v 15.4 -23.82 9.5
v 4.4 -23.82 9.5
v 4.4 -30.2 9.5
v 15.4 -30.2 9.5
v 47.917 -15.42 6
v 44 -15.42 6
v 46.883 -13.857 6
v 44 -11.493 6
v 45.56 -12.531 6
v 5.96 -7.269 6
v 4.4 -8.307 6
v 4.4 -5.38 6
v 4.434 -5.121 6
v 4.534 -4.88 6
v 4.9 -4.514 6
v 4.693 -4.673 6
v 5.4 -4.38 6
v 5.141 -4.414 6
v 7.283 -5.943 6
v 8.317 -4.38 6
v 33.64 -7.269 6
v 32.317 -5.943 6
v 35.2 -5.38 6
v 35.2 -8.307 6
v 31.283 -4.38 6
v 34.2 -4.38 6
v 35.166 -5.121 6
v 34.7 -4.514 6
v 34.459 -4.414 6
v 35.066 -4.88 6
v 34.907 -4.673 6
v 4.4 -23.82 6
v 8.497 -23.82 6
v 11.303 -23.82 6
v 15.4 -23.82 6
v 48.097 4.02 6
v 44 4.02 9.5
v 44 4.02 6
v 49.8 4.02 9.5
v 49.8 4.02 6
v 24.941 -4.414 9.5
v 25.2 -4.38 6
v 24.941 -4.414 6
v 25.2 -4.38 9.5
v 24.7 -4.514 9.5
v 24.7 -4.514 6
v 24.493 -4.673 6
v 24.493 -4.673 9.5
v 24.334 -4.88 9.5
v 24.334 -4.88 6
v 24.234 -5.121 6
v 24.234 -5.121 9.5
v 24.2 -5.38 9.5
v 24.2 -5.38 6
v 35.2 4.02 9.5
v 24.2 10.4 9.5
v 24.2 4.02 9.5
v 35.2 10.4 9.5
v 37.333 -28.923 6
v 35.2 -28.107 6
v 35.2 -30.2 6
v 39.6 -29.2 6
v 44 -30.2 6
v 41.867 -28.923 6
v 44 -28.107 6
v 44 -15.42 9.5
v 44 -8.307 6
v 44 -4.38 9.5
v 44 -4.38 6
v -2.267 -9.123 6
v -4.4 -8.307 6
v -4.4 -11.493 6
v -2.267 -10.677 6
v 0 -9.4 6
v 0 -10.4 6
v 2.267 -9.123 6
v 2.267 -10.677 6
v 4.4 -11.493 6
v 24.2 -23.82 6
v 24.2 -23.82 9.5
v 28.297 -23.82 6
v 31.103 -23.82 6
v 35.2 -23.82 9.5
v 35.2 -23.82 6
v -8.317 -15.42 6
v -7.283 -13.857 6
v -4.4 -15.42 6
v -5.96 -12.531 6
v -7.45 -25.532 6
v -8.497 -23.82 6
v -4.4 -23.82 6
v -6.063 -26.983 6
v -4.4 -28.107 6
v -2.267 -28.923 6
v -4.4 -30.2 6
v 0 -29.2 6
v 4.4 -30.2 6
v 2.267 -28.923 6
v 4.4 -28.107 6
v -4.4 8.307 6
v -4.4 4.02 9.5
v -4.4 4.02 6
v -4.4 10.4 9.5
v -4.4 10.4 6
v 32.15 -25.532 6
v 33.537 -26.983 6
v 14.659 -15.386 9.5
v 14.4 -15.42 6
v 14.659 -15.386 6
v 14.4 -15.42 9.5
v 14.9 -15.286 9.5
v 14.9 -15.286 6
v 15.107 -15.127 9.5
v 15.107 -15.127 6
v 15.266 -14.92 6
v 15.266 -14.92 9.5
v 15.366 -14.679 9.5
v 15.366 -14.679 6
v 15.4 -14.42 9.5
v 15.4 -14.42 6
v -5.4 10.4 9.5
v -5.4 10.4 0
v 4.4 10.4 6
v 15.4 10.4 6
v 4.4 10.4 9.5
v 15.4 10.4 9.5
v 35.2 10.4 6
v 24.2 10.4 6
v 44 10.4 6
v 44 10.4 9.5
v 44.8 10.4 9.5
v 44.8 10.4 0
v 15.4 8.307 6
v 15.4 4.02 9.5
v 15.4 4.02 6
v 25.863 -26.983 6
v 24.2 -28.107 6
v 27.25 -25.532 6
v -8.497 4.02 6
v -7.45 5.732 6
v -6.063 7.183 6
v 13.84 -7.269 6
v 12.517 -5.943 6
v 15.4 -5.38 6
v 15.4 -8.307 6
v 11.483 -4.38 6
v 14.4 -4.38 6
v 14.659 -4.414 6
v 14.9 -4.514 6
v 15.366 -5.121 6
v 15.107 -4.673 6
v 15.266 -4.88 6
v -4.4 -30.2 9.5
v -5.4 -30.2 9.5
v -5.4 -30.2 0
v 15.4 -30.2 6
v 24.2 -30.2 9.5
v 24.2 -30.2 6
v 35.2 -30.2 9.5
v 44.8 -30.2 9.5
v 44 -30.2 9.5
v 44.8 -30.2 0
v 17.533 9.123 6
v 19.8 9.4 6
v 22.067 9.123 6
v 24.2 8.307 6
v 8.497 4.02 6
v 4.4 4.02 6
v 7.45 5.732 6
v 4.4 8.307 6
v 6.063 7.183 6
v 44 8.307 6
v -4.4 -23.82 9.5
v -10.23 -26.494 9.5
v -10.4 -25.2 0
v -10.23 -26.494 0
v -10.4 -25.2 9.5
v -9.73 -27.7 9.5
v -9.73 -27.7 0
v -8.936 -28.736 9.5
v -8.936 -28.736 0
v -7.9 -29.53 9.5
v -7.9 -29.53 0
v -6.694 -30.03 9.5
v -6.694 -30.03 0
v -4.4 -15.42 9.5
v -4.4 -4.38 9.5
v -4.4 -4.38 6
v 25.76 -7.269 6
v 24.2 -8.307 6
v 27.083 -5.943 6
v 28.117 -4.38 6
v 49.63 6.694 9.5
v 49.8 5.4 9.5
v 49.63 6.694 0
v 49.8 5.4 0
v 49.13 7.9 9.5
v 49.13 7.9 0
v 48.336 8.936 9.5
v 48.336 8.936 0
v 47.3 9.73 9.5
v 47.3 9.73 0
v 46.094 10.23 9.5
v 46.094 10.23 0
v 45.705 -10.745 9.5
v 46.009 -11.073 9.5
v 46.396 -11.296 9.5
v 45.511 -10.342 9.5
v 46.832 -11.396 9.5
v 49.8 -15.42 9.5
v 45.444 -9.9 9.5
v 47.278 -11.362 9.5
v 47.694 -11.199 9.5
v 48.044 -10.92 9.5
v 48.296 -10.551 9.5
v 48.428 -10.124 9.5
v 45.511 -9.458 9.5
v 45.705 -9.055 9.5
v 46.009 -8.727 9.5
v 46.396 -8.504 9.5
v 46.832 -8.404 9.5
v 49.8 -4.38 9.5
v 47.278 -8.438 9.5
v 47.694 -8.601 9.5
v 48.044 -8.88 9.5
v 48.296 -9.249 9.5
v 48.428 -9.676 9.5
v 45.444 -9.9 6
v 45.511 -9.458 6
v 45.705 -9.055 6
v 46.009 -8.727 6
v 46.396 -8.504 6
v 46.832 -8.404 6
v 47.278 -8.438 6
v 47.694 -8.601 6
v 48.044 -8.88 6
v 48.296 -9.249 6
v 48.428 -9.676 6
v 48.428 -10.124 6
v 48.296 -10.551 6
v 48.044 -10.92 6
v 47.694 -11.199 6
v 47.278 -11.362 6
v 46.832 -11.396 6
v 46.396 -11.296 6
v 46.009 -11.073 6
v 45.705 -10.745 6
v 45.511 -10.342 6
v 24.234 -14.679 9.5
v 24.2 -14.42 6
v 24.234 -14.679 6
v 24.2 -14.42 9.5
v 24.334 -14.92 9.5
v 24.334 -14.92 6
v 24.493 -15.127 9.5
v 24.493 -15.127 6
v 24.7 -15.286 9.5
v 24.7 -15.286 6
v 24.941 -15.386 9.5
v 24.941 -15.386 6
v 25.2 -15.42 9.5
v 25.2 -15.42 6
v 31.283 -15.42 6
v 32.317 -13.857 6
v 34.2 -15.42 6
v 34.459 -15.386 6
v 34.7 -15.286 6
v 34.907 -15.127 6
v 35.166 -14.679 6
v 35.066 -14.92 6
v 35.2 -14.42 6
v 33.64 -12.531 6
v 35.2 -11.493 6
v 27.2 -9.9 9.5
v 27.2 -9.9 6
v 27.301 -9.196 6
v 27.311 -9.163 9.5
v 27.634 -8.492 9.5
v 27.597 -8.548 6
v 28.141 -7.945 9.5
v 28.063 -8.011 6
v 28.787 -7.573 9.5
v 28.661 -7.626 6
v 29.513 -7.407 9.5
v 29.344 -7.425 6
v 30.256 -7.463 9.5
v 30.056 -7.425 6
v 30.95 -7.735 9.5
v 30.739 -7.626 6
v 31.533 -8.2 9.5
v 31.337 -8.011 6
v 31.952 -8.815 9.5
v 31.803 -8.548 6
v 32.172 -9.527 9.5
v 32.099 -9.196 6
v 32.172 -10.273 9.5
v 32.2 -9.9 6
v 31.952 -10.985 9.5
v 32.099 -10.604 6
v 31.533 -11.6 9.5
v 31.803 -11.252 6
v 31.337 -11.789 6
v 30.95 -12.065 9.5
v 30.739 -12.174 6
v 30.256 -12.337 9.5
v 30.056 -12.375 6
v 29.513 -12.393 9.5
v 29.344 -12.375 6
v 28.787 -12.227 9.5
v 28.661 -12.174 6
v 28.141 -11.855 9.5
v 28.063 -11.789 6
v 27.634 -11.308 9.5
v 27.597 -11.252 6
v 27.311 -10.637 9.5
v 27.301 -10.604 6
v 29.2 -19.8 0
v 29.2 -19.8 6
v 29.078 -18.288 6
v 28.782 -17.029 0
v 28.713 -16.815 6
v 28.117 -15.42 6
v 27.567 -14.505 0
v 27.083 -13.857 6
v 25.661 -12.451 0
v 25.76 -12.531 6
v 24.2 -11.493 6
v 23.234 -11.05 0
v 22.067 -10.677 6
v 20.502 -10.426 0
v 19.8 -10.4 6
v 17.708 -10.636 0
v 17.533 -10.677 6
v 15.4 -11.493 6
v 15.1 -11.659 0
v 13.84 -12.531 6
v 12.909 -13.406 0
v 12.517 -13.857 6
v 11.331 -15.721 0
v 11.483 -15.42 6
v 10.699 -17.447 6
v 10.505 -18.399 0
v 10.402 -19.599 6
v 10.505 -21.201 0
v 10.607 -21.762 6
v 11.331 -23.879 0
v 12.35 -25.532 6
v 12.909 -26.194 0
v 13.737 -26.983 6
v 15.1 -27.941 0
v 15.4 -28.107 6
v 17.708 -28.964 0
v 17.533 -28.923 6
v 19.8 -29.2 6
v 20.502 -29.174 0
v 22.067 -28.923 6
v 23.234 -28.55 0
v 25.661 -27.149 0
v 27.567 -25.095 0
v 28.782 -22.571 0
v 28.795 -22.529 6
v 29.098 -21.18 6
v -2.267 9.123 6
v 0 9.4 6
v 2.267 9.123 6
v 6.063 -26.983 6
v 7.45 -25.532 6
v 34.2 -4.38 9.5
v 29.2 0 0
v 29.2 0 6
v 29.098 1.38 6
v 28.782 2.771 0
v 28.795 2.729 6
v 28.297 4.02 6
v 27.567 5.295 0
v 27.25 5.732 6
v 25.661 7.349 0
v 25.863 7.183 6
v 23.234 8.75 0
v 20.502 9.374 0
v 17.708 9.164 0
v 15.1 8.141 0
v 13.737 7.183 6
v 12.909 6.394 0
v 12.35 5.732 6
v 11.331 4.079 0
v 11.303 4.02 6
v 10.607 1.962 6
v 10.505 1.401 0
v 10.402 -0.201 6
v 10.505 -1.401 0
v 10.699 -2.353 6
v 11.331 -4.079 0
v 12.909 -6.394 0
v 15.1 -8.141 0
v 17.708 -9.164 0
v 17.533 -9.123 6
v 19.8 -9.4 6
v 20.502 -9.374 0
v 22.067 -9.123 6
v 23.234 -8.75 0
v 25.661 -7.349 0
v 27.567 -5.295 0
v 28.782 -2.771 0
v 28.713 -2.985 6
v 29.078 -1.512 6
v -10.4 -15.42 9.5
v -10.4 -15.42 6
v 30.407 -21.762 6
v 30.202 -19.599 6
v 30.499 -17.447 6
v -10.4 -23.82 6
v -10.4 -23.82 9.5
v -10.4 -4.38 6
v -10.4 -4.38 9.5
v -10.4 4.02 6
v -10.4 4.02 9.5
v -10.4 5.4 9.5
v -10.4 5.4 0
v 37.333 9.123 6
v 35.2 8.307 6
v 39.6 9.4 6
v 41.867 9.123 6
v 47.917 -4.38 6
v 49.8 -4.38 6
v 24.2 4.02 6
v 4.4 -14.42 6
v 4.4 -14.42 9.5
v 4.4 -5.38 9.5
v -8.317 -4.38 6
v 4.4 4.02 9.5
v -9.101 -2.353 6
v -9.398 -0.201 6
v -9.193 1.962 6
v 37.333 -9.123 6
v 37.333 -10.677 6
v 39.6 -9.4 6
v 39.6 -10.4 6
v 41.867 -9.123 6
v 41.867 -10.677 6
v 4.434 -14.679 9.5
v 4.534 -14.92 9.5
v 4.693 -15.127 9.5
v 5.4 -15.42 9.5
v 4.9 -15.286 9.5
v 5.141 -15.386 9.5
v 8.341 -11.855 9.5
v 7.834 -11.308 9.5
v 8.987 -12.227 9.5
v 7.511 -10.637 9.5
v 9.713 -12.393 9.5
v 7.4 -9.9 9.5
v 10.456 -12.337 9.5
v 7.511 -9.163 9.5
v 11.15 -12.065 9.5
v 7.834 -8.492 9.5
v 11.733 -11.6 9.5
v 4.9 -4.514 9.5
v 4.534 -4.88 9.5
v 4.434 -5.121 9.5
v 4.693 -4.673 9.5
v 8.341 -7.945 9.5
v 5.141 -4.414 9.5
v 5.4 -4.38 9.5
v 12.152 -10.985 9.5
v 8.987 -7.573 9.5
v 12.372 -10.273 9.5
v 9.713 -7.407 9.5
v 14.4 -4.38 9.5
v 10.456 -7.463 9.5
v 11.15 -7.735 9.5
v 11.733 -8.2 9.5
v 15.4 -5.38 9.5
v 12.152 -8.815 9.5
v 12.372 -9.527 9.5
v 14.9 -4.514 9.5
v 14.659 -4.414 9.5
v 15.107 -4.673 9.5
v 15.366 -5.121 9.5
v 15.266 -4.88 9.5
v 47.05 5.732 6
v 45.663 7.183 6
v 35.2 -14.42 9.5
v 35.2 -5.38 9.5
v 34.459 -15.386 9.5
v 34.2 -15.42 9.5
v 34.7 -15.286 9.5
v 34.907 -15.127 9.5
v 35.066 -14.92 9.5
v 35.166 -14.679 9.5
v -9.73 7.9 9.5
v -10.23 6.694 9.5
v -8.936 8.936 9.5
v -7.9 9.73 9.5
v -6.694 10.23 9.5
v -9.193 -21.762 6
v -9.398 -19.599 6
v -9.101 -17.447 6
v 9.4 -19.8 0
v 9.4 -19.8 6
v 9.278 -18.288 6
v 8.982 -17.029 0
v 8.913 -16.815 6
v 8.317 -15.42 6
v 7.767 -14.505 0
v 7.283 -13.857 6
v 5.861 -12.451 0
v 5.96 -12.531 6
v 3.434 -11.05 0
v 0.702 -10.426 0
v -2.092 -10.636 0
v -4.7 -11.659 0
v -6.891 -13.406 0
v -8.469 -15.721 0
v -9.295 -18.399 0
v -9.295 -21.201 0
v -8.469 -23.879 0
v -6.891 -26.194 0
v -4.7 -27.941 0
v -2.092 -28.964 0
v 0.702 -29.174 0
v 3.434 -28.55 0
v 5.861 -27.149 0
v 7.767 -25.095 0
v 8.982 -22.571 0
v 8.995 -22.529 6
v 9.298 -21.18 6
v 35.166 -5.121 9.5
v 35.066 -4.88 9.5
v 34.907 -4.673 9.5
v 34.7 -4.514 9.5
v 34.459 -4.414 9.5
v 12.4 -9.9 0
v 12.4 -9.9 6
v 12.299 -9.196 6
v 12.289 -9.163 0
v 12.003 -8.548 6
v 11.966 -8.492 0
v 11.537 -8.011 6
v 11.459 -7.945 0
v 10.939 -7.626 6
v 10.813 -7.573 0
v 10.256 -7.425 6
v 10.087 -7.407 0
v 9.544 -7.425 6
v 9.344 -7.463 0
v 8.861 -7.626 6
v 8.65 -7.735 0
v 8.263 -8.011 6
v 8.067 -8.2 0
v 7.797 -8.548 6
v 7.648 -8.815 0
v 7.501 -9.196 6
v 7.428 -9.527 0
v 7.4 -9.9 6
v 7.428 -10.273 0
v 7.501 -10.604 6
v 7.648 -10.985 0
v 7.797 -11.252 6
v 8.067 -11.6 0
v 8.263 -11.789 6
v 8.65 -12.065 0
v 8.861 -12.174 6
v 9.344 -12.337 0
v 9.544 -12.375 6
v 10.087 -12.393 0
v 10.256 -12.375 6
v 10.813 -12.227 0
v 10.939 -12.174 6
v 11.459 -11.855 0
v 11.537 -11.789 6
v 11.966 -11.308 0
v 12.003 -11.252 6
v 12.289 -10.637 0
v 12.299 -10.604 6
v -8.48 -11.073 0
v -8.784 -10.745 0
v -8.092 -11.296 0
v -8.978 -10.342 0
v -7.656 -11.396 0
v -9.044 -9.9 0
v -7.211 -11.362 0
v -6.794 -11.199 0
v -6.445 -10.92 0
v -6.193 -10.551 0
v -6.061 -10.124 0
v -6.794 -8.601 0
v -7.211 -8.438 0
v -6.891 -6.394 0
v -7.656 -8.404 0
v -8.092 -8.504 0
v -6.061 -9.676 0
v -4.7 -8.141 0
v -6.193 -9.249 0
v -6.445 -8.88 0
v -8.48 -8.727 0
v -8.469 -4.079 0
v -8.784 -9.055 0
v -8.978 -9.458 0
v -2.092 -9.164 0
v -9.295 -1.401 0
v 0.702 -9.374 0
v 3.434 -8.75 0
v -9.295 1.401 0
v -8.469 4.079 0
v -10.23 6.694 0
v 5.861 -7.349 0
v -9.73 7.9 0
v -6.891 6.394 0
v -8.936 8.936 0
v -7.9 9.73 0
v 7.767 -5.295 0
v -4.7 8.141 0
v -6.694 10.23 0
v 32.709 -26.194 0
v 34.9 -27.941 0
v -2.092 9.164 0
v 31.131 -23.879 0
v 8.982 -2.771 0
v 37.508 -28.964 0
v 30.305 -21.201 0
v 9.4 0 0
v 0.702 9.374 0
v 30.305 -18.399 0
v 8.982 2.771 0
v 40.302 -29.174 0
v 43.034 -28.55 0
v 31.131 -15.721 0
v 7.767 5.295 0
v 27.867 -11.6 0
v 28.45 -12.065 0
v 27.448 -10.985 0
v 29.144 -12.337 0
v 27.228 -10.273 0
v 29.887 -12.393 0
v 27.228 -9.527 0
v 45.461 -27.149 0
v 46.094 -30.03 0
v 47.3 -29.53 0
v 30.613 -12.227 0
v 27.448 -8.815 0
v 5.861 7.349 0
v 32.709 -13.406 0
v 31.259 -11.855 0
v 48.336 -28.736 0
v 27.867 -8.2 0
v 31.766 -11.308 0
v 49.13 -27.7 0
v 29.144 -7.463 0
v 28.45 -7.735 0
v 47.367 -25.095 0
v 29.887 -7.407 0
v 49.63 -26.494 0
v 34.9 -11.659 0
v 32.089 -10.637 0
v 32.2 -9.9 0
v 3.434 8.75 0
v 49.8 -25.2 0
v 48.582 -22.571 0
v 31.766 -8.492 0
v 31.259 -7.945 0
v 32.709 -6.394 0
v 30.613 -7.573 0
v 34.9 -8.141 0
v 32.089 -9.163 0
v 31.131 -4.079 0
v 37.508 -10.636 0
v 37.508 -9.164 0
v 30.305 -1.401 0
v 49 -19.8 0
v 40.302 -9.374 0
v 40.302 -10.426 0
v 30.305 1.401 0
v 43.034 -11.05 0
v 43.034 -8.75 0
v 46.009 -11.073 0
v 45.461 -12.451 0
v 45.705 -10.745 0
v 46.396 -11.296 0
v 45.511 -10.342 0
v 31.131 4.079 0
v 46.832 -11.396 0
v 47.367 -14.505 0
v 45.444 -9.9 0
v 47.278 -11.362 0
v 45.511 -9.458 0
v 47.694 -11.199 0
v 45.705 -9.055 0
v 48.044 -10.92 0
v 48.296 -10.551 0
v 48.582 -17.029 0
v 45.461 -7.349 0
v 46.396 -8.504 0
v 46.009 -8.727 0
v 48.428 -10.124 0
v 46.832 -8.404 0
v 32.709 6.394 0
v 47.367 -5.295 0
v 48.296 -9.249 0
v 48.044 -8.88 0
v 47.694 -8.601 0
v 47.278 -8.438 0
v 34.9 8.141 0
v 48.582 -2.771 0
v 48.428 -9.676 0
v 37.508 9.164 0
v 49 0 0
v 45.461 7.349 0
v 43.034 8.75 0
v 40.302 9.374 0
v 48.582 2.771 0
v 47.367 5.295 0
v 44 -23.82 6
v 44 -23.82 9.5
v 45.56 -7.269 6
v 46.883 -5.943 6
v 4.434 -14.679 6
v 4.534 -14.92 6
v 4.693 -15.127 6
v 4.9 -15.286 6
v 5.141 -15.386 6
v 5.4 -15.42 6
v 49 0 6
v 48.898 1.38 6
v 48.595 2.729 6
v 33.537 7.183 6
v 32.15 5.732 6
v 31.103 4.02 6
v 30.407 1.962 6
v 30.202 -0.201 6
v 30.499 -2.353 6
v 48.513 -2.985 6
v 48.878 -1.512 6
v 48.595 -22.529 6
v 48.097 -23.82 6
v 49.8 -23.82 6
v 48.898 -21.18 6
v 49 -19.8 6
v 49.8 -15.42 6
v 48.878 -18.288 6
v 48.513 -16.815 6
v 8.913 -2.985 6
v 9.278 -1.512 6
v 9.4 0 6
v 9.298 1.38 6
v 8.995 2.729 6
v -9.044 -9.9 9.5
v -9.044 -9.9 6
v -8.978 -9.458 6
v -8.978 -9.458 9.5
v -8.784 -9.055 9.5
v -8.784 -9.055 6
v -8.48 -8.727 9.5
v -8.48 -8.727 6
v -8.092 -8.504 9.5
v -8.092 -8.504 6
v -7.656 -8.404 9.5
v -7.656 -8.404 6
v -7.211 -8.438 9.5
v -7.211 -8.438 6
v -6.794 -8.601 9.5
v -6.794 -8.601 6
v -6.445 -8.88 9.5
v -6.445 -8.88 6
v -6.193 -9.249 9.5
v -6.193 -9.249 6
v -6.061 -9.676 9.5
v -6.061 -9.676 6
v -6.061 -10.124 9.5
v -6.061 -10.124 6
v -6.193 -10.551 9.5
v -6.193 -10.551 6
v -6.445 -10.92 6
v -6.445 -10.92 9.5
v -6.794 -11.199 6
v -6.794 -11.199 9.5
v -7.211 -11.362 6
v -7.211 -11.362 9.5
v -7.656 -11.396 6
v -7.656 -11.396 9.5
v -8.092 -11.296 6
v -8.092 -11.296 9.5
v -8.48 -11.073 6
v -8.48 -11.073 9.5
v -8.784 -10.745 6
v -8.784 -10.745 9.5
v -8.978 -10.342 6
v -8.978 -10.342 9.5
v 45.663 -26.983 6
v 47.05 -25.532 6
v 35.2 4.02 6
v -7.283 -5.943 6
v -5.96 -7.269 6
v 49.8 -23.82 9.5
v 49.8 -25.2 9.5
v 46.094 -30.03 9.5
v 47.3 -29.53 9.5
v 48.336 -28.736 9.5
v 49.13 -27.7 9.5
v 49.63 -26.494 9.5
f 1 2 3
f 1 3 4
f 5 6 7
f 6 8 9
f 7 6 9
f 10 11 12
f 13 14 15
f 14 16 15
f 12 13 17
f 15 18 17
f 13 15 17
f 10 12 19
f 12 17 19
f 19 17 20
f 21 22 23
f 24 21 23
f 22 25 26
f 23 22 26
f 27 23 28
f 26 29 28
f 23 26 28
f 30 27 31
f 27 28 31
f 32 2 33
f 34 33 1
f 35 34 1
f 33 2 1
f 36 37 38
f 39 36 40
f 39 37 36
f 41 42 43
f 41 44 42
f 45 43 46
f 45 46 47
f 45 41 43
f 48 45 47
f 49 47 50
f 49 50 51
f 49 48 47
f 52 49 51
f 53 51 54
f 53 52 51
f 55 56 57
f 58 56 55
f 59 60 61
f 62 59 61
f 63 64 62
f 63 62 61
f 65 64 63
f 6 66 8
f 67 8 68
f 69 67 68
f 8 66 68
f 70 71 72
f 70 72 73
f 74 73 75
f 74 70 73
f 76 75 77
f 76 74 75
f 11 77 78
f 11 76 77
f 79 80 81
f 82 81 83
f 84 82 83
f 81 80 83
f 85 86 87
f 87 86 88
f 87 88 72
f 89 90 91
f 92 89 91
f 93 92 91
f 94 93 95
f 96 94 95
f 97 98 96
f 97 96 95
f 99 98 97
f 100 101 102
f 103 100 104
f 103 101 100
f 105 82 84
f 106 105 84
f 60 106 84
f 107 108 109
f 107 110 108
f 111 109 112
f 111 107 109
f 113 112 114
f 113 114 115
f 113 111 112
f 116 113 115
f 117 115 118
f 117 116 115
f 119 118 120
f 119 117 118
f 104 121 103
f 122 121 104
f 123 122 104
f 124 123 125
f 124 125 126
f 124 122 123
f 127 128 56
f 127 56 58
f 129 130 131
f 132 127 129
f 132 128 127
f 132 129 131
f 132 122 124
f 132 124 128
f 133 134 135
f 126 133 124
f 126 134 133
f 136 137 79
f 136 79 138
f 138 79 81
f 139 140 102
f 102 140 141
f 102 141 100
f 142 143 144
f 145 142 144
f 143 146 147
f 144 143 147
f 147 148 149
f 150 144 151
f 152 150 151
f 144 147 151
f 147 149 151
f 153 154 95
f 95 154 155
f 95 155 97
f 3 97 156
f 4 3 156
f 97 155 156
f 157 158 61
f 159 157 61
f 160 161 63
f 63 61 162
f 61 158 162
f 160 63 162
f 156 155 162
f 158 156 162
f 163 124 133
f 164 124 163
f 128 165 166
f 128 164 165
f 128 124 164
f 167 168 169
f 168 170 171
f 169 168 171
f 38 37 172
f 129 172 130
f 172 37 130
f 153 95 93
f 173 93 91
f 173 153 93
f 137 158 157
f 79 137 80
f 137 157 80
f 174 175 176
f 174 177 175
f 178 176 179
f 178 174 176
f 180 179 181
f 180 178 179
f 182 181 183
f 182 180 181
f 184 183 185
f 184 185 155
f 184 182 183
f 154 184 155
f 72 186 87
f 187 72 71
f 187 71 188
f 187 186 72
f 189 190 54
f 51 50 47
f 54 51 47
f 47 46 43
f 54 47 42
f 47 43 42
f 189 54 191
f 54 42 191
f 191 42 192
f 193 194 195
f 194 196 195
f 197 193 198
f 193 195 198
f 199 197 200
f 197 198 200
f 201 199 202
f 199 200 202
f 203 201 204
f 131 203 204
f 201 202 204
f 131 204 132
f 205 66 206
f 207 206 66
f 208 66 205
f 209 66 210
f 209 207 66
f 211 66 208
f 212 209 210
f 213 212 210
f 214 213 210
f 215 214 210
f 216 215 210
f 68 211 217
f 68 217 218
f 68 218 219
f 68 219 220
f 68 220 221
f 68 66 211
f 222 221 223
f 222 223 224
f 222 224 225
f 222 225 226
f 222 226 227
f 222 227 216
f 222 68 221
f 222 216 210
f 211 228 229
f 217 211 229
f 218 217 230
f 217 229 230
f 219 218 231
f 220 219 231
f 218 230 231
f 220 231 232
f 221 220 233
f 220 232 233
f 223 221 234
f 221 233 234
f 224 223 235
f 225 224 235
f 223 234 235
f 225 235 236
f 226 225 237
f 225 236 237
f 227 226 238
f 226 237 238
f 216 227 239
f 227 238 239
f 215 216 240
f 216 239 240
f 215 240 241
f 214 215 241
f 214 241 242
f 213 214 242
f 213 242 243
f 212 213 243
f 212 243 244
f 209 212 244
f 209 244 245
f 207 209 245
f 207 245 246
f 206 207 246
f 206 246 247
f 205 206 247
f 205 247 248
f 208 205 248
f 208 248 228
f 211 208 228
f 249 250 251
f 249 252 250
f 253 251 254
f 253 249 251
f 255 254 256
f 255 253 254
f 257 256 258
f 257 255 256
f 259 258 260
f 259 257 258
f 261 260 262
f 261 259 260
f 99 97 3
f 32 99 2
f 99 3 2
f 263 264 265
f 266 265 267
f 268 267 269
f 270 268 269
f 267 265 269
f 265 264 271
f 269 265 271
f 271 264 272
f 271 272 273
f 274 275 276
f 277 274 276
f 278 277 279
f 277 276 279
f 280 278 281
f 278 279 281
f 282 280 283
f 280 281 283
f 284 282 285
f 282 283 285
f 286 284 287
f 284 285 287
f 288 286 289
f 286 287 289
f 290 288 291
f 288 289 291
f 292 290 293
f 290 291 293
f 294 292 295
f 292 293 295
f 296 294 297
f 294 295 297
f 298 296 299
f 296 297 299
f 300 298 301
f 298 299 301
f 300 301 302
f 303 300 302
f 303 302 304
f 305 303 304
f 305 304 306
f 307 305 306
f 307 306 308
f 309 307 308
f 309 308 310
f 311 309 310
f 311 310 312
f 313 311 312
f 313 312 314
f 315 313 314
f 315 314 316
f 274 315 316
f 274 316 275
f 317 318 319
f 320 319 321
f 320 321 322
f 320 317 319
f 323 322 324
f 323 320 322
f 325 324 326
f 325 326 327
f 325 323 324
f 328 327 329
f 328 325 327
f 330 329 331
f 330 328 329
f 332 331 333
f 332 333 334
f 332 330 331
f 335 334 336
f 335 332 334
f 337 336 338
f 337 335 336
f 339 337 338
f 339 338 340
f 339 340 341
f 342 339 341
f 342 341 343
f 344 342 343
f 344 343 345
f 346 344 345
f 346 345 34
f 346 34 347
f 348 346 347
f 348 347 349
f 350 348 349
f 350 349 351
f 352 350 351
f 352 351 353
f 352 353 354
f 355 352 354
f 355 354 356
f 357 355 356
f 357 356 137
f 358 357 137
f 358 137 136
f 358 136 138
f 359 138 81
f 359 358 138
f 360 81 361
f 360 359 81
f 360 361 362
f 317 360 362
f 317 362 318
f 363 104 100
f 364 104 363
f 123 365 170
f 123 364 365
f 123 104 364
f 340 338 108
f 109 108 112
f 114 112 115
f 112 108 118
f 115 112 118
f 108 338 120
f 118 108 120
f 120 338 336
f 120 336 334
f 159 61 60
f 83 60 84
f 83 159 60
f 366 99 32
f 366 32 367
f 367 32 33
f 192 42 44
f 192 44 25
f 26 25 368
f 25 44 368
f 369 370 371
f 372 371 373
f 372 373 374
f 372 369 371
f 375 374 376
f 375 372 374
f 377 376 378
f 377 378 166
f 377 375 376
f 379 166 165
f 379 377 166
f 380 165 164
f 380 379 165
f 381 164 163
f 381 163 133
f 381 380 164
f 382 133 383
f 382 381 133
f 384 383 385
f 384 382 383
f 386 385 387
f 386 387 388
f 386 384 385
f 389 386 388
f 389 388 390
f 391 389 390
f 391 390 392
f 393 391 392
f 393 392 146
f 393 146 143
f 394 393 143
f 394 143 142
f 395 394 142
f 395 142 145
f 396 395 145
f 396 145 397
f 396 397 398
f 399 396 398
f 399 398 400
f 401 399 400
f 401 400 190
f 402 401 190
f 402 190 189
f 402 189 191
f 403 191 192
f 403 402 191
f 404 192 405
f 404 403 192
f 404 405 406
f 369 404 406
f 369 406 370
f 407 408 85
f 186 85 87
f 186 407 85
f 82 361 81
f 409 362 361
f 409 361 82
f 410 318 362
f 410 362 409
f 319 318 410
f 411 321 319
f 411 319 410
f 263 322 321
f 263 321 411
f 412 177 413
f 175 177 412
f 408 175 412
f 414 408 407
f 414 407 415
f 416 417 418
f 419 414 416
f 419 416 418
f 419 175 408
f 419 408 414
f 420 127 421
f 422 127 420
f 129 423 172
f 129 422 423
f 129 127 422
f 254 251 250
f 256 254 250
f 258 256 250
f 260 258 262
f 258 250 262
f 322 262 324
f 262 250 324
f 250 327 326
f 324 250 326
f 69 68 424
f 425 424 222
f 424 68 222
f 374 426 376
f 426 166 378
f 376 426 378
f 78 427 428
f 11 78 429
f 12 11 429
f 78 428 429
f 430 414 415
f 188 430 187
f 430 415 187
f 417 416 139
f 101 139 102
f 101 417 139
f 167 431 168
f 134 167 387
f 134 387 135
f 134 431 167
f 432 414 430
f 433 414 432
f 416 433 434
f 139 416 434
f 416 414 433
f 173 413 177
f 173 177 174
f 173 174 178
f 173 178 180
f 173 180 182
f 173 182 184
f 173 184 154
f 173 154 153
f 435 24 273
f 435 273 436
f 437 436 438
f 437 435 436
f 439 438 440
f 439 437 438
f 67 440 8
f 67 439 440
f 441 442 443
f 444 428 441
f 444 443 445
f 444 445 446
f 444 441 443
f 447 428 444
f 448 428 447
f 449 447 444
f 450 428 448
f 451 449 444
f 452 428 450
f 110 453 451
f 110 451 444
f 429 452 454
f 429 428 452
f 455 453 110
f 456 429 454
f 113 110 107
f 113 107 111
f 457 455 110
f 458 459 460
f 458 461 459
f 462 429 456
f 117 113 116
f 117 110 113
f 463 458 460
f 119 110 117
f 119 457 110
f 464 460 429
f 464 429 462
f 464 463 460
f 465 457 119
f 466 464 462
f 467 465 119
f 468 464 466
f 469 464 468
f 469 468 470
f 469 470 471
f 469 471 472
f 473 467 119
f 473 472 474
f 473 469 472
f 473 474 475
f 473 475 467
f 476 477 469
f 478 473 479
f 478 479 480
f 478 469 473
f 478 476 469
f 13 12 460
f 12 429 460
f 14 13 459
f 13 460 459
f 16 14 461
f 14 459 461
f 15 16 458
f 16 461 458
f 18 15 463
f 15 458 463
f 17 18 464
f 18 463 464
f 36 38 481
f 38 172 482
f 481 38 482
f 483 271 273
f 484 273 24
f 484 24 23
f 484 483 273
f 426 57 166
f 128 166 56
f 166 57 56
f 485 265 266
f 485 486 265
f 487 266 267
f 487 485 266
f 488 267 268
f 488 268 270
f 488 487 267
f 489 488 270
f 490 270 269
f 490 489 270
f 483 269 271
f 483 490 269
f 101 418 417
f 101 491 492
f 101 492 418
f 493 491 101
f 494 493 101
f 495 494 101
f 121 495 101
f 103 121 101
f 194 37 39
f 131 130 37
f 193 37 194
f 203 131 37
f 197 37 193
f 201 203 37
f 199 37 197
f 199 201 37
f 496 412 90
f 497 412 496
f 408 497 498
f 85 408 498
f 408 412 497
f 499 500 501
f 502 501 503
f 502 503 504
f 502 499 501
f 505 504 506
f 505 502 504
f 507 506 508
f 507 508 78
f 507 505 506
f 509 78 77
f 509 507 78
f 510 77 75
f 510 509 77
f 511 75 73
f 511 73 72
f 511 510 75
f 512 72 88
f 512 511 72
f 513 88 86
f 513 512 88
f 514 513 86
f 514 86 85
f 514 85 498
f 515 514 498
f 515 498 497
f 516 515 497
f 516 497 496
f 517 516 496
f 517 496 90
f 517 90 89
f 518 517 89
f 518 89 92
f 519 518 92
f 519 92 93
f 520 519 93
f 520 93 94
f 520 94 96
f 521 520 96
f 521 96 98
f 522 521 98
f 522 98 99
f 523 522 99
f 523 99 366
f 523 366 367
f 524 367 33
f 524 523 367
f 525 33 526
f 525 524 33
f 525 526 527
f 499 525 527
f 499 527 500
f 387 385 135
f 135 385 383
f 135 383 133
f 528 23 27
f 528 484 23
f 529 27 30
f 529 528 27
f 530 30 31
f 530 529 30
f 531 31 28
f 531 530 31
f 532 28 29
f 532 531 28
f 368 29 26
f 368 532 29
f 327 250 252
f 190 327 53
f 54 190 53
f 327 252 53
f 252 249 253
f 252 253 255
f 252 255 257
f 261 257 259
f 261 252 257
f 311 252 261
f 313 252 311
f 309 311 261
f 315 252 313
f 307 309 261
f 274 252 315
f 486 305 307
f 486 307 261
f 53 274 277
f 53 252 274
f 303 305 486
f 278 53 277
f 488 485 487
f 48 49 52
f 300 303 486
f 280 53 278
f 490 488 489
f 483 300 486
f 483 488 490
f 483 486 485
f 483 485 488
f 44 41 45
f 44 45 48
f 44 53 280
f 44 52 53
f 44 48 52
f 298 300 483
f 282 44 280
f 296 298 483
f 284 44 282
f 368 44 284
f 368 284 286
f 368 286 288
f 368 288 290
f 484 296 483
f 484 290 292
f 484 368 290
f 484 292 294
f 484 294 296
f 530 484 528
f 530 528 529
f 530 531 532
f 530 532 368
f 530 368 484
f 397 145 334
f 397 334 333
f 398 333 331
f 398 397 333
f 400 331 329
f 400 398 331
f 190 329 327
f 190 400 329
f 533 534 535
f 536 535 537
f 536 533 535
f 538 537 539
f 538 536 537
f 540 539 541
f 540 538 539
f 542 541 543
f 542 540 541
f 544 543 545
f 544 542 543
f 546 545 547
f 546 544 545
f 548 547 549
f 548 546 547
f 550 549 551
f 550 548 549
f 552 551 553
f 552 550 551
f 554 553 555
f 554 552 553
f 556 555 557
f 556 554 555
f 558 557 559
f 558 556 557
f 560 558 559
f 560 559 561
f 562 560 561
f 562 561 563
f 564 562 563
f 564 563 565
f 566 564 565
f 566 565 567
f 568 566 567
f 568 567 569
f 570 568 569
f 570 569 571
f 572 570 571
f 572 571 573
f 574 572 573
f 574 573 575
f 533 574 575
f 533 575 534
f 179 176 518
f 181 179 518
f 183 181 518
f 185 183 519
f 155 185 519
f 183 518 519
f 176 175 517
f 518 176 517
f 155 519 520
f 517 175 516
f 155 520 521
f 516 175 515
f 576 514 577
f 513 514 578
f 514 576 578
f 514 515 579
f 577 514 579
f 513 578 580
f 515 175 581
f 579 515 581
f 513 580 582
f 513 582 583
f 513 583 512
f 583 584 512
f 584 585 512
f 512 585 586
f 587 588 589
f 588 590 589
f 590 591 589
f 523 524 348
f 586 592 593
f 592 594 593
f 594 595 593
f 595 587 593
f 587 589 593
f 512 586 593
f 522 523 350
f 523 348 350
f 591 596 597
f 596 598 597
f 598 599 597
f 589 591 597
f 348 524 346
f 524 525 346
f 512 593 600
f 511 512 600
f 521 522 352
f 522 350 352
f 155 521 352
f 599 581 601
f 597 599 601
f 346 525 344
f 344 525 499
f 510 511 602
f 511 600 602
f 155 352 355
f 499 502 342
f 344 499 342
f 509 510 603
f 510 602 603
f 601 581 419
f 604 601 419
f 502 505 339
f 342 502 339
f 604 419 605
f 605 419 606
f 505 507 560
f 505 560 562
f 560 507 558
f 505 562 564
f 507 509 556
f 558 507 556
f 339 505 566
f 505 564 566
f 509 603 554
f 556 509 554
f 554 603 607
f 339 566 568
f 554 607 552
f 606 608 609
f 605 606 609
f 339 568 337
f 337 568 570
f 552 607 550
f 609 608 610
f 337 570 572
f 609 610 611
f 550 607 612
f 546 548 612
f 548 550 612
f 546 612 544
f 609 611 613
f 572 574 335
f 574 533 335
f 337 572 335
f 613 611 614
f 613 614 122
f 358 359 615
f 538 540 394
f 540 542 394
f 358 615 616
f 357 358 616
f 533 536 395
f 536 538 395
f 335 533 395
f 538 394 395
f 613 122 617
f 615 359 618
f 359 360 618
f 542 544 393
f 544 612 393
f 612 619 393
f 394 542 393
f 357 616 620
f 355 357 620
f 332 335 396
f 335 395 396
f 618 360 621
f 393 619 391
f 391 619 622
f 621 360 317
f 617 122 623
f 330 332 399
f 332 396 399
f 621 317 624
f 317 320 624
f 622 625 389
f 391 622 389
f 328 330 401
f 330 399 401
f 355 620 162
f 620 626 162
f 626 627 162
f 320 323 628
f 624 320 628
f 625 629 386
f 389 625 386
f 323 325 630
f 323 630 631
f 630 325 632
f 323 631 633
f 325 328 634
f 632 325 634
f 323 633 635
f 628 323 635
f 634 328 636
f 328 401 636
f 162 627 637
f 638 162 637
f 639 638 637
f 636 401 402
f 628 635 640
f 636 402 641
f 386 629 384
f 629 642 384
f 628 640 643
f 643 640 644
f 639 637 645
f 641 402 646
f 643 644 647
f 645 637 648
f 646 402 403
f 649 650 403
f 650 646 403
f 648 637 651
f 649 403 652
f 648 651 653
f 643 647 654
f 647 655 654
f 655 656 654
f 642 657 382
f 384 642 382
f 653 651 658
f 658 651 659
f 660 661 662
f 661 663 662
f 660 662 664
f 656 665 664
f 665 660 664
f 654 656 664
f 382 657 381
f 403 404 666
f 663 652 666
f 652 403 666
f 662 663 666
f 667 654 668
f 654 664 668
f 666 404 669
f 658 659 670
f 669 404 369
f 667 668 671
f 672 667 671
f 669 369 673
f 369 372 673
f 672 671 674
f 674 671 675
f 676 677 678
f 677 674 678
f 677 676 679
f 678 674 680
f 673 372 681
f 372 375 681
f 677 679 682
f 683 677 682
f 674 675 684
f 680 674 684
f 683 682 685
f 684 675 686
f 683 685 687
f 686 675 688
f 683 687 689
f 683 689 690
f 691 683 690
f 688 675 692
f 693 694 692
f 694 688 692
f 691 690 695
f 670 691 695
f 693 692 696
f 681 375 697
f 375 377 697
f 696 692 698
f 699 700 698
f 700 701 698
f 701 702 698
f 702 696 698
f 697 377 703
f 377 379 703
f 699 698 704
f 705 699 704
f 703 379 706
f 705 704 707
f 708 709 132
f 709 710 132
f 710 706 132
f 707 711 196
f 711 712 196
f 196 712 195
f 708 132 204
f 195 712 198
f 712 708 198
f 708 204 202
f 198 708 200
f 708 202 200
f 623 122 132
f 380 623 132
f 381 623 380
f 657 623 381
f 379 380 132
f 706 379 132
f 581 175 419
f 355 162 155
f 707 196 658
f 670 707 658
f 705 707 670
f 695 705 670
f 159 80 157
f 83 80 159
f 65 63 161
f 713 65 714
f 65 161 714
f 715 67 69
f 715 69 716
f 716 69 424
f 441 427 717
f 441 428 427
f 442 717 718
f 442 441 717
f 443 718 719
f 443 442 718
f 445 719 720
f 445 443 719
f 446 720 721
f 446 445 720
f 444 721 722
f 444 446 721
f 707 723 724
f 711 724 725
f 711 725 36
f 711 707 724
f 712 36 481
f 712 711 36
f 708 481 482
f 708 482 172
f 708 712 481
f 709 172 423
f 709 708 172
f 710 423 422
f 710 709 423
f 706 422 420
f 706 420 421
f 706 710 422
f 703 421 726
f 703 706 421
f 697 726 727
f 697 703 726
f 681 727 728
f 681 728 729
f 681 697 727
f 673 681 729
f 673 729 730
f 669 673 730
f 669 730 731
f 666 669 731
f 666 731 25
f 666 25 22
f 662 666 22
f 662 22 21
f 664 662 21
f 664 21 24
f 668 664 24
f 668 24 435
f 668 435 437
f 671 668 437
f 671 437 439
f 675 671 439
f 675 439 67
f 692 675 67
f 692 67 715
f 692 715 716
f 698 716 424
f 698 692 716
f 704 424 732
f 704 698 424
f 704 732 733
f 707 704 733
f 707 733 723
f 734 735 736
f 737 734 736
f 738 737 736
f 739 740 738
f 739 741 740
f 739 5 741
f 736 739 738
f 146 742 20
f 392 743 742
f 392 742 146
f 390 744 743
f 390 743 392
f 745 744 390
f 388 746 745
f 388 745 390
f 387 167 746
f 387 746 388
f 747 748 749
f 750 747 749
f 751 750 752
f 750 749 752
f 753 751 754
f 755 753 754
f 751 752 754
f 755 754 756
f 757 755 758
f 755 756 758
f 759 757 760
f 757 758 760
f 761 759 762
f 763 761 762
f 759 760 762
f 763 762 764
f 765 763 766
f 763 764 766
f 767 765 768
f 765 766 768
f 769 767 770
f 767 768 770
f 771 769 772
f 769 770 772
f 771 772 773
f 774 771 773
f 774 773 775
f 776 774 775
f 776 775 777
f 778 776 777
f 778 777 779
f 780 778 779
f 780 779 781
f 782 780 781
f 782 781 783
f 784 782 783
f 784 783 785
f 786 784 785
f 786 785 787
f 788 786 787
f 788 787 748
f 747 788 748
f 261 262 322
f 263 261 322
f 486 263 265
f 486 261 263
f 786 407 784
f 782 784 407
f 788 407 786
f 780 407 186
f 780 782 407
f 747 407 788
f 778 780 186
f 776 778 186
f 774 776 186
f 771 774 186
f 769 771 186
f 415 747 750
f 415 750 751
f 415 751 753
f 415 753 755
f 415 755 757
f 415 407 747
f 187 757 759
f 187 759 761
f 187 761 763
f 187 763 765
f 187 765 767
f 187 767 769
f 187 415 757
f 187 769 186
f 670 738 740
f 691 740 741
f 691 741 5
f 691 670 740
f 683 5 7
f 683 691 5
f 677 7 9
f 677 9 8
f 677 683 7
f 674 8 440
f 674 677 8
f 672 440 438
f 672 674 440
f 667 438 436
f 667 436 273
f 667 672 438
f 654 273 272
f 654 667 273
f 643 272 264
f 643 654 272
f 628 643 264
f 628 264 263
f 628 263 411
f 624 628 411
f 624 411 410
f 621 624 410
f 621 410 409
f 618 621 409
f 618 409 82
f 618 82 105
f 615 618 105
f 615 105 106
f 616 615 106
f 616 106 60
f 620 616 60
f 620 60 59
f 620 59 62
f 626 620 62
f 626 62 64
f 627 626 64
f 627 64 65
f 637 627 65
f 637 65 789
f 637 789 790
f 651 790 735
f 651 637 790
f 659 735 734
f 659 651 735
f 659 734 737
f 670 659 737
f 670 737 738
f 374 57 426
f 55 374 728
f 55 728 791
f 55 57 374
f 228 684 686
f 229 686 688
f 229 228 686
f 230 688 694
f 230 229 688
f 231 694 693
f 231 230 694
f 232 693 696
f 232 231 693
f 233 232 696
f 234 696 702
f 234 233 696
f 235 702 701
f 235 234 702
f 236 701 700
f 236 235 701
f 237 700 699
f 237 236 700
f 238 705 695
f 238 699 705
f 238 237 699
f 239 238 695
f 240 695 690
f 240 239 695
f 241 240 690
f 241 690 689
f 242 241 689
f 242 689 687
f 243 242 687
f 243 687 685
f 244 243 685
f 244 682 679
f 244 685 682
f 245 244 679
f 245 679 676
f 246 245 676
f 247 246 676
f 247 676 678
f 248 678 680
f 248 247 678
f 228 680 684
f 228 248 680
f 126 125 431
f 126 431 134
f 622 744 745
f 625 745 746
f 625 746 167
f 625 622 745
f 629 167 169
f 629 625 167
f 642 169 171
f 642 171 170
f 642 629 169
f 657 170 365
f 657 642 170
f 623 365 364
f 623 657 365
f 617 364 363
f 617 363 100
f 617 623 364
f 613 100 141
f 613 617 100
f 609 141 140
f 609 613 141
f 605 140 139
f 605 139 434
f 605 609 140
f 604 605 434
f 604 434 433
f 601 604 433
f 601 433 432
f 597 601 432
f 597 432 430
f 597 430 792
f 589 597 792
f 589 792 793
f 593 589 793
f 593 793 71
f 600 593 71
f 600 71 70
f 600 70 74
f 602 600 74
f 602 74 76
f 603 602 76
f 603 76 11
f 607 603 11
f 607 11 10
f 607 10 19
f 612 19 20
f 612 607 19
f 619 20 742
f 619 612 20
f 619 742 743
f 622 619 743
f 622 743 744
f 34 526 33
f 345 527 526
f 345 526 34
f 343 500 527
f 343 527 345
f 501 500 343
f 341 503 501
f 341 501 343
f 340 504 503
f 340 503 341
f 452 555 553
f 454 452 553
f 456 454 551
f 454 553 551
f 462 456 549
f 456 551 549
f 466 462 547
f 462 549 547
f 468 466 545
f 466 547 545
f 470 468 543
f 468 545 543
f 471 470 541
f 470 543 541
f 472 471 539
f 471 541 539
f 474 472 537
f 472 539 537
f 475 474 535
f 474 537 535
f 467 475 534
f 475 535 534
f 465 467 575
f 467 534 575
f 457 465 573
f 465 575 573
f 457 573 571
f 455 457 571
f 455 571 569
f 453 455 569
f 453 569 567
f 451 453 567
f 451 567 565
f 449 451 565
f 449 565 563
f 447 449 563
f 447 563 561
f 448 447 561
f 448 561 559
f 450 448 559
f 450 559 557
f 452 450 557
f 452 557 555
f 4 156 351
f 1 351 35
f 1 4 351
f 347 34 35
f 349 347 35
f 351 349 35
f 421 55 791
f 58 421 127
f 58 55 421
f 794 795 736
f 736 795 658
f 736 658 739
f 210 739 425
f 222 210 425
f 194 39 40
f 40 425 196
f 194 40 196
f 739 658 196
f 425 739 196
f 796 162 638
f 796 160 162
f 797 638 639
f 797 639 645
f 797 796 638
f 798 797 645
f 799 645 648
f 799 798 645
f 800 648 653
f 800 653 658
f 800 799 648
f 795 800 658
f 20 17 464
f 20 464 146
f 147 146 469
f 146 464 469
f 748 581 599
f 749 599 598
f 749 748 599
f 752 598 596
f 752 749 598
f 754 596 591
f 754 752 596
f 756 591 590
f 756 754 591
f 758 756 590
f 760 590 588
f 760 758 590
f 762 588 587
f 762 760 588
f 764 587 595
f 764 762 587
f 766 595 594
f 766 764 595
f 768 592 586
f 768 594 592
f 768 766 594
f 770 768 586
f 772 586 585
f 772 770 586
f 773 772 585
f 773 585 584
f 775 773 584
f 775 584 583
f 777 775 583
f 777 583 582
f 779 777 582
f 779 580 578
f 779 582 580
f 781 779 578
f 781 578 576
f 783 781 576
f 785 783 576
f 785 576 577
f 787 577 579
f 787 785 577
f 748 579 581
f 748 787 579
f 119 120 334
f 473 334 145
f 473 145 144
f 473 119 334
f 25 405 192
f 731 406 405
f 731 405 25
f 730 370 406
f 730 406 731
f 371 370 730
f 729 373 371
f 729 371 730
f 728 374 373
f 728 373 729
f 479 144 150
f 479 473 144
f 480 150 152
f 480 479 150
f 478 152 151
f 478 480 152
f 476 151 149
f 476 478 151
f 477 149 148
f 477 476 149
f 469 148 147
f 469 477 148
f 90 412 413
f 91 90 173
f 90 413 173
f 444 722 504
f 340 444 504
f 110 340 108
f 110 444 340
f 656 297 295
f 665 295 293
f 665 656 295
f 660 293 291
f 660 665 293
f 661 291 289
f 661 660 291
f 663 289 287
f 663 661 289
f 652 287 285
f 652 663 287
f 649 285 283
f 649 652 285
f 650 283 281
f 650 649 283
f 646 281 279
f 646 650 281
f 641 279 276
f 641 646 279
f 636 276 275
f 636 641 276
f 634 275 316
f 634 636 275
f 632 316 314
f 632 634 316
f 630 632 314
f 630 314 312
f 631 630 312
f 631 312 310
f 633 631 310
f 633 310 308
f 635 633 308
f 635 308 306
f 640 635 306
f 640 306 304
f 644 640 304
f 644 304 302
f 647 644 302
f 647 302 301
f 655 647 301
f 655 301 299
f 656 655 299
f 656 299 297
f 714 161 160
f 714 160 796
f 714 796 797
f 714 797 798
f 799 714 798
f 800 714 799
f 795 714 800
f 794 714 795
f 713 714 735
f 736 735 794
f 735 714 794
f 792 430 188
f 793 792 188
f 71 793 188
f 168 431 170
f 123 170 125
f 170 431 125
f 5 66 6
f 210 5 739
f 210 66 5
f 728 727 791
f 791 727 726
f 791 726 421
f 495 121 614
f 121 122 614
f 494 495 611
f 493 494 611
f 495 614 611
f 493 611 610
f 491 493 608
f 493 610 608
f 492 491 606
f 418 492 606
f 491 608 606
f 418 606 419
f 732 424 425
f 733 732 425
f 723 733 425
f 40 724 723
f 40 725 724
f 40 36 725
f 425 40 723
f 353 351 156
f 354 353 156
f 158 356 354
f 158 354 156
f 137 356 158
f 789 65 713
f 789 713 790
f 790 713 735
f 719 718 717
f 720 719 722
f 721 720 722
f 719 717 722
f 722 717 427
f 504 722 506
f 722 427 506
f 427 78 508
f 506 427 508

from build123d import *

# Parameters (mm, degrees)
SKETCH_1_W               = 60.2
SKETCH_1_H               = 40.6
SKETCH_1_R               = 9.4
SKETCH_1_R_2             = 2.5
EXTRUDE_1_DEPTH          = 6
SKETCH_2_W               = 60.2
SKETCH_2_H               = 40.6
EXTRUDE_2_DEPTH          = 3.5
SKETCH_3_W               = 60.2
SKETCH_3_H               = 8.4
CUT_EXTRUDE_1_DEPTH      = 3.5
SKETCH_4_W               = 8.8
SKETCH_4_H               = 40.6
CUT_EXTRUDE_2_DEPTH      = 3.5
SKETCH_5_R               = 2.5
SKETCH_5_R_2             = 1.5
CUT_EXTRUDE_3_DEPTH      = 10
CUT_EXTRUDE_3_DEPTH_BACK = 10
FILLET_3_R               = 5
FILLET_8_R               = 5
FILLET_9_R               = 5
FILLET_10_R              = 5
FILLET_11_R              = 1
FILLET_12_R              = 1
FILLET_13_R              = 1
FILLET_14_R              = 1
FILLET_15_R              = 1
FILLET_16_R              = 1
FILLET_17_R              = 1
FILLET_18_R              = 1


with BuildPart() as part:
    # 草图1 → 凸台-拉伸1 (new body)
    with BuildSketch(Plane.XY):
        with Locations((19.7, -9.9)):
            Rectangle(SKETCH_1_W, SKETCH_1_H)
        Circle(SKETCH_1_R, mode=Mode.SUBTRACT)
        with Locations((19.8, 0)):
            Circle(SKETCH_1_R, mode=Mode.SUBTRACT)
        with Locations((39.6, 0)):
            Circle(SKETCH_1_R, mode=Mode.SUBTRACT)
        with Locations((0, -19.8)):
            Circle(SKETCH_1_R, mode=Mode.SUBTRACT)
        with Locations((19.8, -19.8)):
            Circle(SKETCH_1_R, mode=Mode.SUBTRACT)
        with Locations((39.6, -19.8)):
            Circle(SKETCH_1_R, mode=Mode.SUBTRACT)
        with Locations((9.9, -9.9)):
            Circle(SKETCH_1_R_2, mode=Mode.SUBTRACT)
        with Locations((29.7, -9.9)):
            Circle(SKETCH_1_R_2, mode=Mode.SUBTRACT)
    extrude(amount=EXTRUDE_1_DEPTH)

    # 草图2 → 凸台-拉伸2 (add)
    with BuildSketch(Plane.XY.offset(6)):
        with Locations((19.7, -9.9)):
            Rectangle(SKETCH_2_W, SKETCH_2_H)
    extrude(amount=EXTRUDE_2_DEPTH)

    # 草图3 → 切除-拉伸1 (cut)
    with BuildSketch(Plane.XY.offset(9.5)):
        with Locations((19.7, -0.18)):
            Rectangle(SKETCH_3_W, SKETCH_3_H)
        with Locations((19.7, -19.62)):
            Rectangle(SKETCH_3_W, SKETCH_3_H)
    extrude(amount=-CUT_EXTRUDE_1_DEPTH, mode=Mode.SUBTRACT)

    # 草图4 → 切除-拉伸2 (cut)
    with BuildSketch(Plane.XY.offset(9.5)):
        with Locations((0, -9.9)):
            Rectangle(SKETCH_4_W, SKETCH_4_H)
        with Locations((19.8, -9.9)):
            Rectangle(SKETCH_4_W, SKETCH_4_H)
        with Locations((39.6, -9.9)):
            Rectangle(SKETCH_4_W, SKETCH_4_H)
        with Locations((59.4, -9.9)):
            Rectangle(SKETCH_4_W, SKETCH_4_H)
    extrude(amount=-CUT_EXTRUDE_2_DEPTH, mode=Mode.SUBTRACT)

    # 草图5 → 切除-拉伸3 (cut, two sides)
    with BuildSketch(Plane(origin=(0, 0, 6), x_dir=(-1, 0, 0), z_dir=(0, 0, -1))) as cut_extrude_3_sk:
        with Locations((-29.7, -9.9)):
            Circle(SKETCH_5_R)
        with Locations((-9.9, -9.9)):
            Circle(SKETCH_5_R)
        with Locations((-46.944325479, -9.9)):
            Circle(SKETCH_5_R_2)
        with Locations((7.544325479, -9.9)):
            Circle(SKETCH_5_R_2)
    extrude(amount=CUT_EXTRUDE_3_DEPTH, mode=Mode.SUBTRACT)
    extrude(cut_extrude_3_sk.sketch, amount=-CUT_EXTRUDE_3_DEPTH_BACK, mode=Mode.SUBTRACT)

    # 圆角3
    fillet_3_edges = [part.edges().sort_by_distance(p)[0] for p in [
        (-10.4, -30.2, 4.75),
    ]]
    fillet(fillet_3_edges, radius=FILLET_3_R)

    # 圆角8
    fillet_8_edges = [part.edges().sort_by_distance(p)[0] for p in [
        (49.8, -30.2, 4.75),
    ]]
    fillet(fillet_8_edges, radius=FILLET_8_R)

    # 圆角9
    fillet_9_edges = [part.edges().sort_by_distance(p)[0] for p in [
        (49.8, 10.4, 4.75),
    ]]
    fillet(fillet_9_edges, radius=FILLET_9_R)

    # 圆角10
    fillet_10_edges = [part.edges().sort_by_distance(p)[0] for p in [
        (-10.4, 10.4, 4.75),
    ]]
    fillet(fillet_10_edges, radius=FILLET_10_R)

    # 圆角11
    fillet_11_edges = [part.edges().sort_by_distance(p)[0] for p in [
        (4.4, -4.38, 7.75),
    ]]
    fillet(fillet_11_edges, radius=FILLET_11_R)

    # 圆角12
    fillet_12_edges = [part.edges().sort_by_distance(p)[0] for p in [
        (4.4, -15.42, 7.75),
    ]]
    fillet(fillet_12_edges, radius=FILLET_12_R)

    # 圆角13
    fillet_13_edges = [part.edges().sort_by_distance(p)[0] for p in [
        (15.4, -15.42, 7.75),
    ]]
    fillet(fillet_13_edges, radius=FILLET_13_R)

    # 圆角14
    fillet_14_edges = [part.edges().sort_by_distance(p)[0] for p in [
        (15.4, -4.38, 7.75),
    ]]
    fillet(fillet_14_edges, radius=FILLET_14_R)

    # 圆角15
    fillet_15_edges = [part.edges().sort_by_distance(p)[0] for p in [
        (24.2, -15.42, 7.75),
    ]]
    fillet(fillet_15_edges, radius=FILLET_15_R)

    # 圆角16
    fillet_16_edges = [part.edges().sort_by_distance(p)[0] for p in [
        (35.2, -15.42, 7.75),
    ]]
    fillet(fillet_16_edges, radius=FILLET_16_R)

    # 圆角17
    fillet_17_edges = [part.edges().sort_by_distance(p)[0] for p in [
        (35.2, -4.38, 7.75),
    ]]
    fillet(fillet_17_edges, radius=FILLET_17_R)

    # 圆角18
    fillet_18_edges = [part.edges().sort_by_distance(p)[0] for p in [
        (24.2, -4.38, 7.75),
    ]]
    fillet(fillet_18_edges, radius=FILLET_18_R)


solid = part.part
